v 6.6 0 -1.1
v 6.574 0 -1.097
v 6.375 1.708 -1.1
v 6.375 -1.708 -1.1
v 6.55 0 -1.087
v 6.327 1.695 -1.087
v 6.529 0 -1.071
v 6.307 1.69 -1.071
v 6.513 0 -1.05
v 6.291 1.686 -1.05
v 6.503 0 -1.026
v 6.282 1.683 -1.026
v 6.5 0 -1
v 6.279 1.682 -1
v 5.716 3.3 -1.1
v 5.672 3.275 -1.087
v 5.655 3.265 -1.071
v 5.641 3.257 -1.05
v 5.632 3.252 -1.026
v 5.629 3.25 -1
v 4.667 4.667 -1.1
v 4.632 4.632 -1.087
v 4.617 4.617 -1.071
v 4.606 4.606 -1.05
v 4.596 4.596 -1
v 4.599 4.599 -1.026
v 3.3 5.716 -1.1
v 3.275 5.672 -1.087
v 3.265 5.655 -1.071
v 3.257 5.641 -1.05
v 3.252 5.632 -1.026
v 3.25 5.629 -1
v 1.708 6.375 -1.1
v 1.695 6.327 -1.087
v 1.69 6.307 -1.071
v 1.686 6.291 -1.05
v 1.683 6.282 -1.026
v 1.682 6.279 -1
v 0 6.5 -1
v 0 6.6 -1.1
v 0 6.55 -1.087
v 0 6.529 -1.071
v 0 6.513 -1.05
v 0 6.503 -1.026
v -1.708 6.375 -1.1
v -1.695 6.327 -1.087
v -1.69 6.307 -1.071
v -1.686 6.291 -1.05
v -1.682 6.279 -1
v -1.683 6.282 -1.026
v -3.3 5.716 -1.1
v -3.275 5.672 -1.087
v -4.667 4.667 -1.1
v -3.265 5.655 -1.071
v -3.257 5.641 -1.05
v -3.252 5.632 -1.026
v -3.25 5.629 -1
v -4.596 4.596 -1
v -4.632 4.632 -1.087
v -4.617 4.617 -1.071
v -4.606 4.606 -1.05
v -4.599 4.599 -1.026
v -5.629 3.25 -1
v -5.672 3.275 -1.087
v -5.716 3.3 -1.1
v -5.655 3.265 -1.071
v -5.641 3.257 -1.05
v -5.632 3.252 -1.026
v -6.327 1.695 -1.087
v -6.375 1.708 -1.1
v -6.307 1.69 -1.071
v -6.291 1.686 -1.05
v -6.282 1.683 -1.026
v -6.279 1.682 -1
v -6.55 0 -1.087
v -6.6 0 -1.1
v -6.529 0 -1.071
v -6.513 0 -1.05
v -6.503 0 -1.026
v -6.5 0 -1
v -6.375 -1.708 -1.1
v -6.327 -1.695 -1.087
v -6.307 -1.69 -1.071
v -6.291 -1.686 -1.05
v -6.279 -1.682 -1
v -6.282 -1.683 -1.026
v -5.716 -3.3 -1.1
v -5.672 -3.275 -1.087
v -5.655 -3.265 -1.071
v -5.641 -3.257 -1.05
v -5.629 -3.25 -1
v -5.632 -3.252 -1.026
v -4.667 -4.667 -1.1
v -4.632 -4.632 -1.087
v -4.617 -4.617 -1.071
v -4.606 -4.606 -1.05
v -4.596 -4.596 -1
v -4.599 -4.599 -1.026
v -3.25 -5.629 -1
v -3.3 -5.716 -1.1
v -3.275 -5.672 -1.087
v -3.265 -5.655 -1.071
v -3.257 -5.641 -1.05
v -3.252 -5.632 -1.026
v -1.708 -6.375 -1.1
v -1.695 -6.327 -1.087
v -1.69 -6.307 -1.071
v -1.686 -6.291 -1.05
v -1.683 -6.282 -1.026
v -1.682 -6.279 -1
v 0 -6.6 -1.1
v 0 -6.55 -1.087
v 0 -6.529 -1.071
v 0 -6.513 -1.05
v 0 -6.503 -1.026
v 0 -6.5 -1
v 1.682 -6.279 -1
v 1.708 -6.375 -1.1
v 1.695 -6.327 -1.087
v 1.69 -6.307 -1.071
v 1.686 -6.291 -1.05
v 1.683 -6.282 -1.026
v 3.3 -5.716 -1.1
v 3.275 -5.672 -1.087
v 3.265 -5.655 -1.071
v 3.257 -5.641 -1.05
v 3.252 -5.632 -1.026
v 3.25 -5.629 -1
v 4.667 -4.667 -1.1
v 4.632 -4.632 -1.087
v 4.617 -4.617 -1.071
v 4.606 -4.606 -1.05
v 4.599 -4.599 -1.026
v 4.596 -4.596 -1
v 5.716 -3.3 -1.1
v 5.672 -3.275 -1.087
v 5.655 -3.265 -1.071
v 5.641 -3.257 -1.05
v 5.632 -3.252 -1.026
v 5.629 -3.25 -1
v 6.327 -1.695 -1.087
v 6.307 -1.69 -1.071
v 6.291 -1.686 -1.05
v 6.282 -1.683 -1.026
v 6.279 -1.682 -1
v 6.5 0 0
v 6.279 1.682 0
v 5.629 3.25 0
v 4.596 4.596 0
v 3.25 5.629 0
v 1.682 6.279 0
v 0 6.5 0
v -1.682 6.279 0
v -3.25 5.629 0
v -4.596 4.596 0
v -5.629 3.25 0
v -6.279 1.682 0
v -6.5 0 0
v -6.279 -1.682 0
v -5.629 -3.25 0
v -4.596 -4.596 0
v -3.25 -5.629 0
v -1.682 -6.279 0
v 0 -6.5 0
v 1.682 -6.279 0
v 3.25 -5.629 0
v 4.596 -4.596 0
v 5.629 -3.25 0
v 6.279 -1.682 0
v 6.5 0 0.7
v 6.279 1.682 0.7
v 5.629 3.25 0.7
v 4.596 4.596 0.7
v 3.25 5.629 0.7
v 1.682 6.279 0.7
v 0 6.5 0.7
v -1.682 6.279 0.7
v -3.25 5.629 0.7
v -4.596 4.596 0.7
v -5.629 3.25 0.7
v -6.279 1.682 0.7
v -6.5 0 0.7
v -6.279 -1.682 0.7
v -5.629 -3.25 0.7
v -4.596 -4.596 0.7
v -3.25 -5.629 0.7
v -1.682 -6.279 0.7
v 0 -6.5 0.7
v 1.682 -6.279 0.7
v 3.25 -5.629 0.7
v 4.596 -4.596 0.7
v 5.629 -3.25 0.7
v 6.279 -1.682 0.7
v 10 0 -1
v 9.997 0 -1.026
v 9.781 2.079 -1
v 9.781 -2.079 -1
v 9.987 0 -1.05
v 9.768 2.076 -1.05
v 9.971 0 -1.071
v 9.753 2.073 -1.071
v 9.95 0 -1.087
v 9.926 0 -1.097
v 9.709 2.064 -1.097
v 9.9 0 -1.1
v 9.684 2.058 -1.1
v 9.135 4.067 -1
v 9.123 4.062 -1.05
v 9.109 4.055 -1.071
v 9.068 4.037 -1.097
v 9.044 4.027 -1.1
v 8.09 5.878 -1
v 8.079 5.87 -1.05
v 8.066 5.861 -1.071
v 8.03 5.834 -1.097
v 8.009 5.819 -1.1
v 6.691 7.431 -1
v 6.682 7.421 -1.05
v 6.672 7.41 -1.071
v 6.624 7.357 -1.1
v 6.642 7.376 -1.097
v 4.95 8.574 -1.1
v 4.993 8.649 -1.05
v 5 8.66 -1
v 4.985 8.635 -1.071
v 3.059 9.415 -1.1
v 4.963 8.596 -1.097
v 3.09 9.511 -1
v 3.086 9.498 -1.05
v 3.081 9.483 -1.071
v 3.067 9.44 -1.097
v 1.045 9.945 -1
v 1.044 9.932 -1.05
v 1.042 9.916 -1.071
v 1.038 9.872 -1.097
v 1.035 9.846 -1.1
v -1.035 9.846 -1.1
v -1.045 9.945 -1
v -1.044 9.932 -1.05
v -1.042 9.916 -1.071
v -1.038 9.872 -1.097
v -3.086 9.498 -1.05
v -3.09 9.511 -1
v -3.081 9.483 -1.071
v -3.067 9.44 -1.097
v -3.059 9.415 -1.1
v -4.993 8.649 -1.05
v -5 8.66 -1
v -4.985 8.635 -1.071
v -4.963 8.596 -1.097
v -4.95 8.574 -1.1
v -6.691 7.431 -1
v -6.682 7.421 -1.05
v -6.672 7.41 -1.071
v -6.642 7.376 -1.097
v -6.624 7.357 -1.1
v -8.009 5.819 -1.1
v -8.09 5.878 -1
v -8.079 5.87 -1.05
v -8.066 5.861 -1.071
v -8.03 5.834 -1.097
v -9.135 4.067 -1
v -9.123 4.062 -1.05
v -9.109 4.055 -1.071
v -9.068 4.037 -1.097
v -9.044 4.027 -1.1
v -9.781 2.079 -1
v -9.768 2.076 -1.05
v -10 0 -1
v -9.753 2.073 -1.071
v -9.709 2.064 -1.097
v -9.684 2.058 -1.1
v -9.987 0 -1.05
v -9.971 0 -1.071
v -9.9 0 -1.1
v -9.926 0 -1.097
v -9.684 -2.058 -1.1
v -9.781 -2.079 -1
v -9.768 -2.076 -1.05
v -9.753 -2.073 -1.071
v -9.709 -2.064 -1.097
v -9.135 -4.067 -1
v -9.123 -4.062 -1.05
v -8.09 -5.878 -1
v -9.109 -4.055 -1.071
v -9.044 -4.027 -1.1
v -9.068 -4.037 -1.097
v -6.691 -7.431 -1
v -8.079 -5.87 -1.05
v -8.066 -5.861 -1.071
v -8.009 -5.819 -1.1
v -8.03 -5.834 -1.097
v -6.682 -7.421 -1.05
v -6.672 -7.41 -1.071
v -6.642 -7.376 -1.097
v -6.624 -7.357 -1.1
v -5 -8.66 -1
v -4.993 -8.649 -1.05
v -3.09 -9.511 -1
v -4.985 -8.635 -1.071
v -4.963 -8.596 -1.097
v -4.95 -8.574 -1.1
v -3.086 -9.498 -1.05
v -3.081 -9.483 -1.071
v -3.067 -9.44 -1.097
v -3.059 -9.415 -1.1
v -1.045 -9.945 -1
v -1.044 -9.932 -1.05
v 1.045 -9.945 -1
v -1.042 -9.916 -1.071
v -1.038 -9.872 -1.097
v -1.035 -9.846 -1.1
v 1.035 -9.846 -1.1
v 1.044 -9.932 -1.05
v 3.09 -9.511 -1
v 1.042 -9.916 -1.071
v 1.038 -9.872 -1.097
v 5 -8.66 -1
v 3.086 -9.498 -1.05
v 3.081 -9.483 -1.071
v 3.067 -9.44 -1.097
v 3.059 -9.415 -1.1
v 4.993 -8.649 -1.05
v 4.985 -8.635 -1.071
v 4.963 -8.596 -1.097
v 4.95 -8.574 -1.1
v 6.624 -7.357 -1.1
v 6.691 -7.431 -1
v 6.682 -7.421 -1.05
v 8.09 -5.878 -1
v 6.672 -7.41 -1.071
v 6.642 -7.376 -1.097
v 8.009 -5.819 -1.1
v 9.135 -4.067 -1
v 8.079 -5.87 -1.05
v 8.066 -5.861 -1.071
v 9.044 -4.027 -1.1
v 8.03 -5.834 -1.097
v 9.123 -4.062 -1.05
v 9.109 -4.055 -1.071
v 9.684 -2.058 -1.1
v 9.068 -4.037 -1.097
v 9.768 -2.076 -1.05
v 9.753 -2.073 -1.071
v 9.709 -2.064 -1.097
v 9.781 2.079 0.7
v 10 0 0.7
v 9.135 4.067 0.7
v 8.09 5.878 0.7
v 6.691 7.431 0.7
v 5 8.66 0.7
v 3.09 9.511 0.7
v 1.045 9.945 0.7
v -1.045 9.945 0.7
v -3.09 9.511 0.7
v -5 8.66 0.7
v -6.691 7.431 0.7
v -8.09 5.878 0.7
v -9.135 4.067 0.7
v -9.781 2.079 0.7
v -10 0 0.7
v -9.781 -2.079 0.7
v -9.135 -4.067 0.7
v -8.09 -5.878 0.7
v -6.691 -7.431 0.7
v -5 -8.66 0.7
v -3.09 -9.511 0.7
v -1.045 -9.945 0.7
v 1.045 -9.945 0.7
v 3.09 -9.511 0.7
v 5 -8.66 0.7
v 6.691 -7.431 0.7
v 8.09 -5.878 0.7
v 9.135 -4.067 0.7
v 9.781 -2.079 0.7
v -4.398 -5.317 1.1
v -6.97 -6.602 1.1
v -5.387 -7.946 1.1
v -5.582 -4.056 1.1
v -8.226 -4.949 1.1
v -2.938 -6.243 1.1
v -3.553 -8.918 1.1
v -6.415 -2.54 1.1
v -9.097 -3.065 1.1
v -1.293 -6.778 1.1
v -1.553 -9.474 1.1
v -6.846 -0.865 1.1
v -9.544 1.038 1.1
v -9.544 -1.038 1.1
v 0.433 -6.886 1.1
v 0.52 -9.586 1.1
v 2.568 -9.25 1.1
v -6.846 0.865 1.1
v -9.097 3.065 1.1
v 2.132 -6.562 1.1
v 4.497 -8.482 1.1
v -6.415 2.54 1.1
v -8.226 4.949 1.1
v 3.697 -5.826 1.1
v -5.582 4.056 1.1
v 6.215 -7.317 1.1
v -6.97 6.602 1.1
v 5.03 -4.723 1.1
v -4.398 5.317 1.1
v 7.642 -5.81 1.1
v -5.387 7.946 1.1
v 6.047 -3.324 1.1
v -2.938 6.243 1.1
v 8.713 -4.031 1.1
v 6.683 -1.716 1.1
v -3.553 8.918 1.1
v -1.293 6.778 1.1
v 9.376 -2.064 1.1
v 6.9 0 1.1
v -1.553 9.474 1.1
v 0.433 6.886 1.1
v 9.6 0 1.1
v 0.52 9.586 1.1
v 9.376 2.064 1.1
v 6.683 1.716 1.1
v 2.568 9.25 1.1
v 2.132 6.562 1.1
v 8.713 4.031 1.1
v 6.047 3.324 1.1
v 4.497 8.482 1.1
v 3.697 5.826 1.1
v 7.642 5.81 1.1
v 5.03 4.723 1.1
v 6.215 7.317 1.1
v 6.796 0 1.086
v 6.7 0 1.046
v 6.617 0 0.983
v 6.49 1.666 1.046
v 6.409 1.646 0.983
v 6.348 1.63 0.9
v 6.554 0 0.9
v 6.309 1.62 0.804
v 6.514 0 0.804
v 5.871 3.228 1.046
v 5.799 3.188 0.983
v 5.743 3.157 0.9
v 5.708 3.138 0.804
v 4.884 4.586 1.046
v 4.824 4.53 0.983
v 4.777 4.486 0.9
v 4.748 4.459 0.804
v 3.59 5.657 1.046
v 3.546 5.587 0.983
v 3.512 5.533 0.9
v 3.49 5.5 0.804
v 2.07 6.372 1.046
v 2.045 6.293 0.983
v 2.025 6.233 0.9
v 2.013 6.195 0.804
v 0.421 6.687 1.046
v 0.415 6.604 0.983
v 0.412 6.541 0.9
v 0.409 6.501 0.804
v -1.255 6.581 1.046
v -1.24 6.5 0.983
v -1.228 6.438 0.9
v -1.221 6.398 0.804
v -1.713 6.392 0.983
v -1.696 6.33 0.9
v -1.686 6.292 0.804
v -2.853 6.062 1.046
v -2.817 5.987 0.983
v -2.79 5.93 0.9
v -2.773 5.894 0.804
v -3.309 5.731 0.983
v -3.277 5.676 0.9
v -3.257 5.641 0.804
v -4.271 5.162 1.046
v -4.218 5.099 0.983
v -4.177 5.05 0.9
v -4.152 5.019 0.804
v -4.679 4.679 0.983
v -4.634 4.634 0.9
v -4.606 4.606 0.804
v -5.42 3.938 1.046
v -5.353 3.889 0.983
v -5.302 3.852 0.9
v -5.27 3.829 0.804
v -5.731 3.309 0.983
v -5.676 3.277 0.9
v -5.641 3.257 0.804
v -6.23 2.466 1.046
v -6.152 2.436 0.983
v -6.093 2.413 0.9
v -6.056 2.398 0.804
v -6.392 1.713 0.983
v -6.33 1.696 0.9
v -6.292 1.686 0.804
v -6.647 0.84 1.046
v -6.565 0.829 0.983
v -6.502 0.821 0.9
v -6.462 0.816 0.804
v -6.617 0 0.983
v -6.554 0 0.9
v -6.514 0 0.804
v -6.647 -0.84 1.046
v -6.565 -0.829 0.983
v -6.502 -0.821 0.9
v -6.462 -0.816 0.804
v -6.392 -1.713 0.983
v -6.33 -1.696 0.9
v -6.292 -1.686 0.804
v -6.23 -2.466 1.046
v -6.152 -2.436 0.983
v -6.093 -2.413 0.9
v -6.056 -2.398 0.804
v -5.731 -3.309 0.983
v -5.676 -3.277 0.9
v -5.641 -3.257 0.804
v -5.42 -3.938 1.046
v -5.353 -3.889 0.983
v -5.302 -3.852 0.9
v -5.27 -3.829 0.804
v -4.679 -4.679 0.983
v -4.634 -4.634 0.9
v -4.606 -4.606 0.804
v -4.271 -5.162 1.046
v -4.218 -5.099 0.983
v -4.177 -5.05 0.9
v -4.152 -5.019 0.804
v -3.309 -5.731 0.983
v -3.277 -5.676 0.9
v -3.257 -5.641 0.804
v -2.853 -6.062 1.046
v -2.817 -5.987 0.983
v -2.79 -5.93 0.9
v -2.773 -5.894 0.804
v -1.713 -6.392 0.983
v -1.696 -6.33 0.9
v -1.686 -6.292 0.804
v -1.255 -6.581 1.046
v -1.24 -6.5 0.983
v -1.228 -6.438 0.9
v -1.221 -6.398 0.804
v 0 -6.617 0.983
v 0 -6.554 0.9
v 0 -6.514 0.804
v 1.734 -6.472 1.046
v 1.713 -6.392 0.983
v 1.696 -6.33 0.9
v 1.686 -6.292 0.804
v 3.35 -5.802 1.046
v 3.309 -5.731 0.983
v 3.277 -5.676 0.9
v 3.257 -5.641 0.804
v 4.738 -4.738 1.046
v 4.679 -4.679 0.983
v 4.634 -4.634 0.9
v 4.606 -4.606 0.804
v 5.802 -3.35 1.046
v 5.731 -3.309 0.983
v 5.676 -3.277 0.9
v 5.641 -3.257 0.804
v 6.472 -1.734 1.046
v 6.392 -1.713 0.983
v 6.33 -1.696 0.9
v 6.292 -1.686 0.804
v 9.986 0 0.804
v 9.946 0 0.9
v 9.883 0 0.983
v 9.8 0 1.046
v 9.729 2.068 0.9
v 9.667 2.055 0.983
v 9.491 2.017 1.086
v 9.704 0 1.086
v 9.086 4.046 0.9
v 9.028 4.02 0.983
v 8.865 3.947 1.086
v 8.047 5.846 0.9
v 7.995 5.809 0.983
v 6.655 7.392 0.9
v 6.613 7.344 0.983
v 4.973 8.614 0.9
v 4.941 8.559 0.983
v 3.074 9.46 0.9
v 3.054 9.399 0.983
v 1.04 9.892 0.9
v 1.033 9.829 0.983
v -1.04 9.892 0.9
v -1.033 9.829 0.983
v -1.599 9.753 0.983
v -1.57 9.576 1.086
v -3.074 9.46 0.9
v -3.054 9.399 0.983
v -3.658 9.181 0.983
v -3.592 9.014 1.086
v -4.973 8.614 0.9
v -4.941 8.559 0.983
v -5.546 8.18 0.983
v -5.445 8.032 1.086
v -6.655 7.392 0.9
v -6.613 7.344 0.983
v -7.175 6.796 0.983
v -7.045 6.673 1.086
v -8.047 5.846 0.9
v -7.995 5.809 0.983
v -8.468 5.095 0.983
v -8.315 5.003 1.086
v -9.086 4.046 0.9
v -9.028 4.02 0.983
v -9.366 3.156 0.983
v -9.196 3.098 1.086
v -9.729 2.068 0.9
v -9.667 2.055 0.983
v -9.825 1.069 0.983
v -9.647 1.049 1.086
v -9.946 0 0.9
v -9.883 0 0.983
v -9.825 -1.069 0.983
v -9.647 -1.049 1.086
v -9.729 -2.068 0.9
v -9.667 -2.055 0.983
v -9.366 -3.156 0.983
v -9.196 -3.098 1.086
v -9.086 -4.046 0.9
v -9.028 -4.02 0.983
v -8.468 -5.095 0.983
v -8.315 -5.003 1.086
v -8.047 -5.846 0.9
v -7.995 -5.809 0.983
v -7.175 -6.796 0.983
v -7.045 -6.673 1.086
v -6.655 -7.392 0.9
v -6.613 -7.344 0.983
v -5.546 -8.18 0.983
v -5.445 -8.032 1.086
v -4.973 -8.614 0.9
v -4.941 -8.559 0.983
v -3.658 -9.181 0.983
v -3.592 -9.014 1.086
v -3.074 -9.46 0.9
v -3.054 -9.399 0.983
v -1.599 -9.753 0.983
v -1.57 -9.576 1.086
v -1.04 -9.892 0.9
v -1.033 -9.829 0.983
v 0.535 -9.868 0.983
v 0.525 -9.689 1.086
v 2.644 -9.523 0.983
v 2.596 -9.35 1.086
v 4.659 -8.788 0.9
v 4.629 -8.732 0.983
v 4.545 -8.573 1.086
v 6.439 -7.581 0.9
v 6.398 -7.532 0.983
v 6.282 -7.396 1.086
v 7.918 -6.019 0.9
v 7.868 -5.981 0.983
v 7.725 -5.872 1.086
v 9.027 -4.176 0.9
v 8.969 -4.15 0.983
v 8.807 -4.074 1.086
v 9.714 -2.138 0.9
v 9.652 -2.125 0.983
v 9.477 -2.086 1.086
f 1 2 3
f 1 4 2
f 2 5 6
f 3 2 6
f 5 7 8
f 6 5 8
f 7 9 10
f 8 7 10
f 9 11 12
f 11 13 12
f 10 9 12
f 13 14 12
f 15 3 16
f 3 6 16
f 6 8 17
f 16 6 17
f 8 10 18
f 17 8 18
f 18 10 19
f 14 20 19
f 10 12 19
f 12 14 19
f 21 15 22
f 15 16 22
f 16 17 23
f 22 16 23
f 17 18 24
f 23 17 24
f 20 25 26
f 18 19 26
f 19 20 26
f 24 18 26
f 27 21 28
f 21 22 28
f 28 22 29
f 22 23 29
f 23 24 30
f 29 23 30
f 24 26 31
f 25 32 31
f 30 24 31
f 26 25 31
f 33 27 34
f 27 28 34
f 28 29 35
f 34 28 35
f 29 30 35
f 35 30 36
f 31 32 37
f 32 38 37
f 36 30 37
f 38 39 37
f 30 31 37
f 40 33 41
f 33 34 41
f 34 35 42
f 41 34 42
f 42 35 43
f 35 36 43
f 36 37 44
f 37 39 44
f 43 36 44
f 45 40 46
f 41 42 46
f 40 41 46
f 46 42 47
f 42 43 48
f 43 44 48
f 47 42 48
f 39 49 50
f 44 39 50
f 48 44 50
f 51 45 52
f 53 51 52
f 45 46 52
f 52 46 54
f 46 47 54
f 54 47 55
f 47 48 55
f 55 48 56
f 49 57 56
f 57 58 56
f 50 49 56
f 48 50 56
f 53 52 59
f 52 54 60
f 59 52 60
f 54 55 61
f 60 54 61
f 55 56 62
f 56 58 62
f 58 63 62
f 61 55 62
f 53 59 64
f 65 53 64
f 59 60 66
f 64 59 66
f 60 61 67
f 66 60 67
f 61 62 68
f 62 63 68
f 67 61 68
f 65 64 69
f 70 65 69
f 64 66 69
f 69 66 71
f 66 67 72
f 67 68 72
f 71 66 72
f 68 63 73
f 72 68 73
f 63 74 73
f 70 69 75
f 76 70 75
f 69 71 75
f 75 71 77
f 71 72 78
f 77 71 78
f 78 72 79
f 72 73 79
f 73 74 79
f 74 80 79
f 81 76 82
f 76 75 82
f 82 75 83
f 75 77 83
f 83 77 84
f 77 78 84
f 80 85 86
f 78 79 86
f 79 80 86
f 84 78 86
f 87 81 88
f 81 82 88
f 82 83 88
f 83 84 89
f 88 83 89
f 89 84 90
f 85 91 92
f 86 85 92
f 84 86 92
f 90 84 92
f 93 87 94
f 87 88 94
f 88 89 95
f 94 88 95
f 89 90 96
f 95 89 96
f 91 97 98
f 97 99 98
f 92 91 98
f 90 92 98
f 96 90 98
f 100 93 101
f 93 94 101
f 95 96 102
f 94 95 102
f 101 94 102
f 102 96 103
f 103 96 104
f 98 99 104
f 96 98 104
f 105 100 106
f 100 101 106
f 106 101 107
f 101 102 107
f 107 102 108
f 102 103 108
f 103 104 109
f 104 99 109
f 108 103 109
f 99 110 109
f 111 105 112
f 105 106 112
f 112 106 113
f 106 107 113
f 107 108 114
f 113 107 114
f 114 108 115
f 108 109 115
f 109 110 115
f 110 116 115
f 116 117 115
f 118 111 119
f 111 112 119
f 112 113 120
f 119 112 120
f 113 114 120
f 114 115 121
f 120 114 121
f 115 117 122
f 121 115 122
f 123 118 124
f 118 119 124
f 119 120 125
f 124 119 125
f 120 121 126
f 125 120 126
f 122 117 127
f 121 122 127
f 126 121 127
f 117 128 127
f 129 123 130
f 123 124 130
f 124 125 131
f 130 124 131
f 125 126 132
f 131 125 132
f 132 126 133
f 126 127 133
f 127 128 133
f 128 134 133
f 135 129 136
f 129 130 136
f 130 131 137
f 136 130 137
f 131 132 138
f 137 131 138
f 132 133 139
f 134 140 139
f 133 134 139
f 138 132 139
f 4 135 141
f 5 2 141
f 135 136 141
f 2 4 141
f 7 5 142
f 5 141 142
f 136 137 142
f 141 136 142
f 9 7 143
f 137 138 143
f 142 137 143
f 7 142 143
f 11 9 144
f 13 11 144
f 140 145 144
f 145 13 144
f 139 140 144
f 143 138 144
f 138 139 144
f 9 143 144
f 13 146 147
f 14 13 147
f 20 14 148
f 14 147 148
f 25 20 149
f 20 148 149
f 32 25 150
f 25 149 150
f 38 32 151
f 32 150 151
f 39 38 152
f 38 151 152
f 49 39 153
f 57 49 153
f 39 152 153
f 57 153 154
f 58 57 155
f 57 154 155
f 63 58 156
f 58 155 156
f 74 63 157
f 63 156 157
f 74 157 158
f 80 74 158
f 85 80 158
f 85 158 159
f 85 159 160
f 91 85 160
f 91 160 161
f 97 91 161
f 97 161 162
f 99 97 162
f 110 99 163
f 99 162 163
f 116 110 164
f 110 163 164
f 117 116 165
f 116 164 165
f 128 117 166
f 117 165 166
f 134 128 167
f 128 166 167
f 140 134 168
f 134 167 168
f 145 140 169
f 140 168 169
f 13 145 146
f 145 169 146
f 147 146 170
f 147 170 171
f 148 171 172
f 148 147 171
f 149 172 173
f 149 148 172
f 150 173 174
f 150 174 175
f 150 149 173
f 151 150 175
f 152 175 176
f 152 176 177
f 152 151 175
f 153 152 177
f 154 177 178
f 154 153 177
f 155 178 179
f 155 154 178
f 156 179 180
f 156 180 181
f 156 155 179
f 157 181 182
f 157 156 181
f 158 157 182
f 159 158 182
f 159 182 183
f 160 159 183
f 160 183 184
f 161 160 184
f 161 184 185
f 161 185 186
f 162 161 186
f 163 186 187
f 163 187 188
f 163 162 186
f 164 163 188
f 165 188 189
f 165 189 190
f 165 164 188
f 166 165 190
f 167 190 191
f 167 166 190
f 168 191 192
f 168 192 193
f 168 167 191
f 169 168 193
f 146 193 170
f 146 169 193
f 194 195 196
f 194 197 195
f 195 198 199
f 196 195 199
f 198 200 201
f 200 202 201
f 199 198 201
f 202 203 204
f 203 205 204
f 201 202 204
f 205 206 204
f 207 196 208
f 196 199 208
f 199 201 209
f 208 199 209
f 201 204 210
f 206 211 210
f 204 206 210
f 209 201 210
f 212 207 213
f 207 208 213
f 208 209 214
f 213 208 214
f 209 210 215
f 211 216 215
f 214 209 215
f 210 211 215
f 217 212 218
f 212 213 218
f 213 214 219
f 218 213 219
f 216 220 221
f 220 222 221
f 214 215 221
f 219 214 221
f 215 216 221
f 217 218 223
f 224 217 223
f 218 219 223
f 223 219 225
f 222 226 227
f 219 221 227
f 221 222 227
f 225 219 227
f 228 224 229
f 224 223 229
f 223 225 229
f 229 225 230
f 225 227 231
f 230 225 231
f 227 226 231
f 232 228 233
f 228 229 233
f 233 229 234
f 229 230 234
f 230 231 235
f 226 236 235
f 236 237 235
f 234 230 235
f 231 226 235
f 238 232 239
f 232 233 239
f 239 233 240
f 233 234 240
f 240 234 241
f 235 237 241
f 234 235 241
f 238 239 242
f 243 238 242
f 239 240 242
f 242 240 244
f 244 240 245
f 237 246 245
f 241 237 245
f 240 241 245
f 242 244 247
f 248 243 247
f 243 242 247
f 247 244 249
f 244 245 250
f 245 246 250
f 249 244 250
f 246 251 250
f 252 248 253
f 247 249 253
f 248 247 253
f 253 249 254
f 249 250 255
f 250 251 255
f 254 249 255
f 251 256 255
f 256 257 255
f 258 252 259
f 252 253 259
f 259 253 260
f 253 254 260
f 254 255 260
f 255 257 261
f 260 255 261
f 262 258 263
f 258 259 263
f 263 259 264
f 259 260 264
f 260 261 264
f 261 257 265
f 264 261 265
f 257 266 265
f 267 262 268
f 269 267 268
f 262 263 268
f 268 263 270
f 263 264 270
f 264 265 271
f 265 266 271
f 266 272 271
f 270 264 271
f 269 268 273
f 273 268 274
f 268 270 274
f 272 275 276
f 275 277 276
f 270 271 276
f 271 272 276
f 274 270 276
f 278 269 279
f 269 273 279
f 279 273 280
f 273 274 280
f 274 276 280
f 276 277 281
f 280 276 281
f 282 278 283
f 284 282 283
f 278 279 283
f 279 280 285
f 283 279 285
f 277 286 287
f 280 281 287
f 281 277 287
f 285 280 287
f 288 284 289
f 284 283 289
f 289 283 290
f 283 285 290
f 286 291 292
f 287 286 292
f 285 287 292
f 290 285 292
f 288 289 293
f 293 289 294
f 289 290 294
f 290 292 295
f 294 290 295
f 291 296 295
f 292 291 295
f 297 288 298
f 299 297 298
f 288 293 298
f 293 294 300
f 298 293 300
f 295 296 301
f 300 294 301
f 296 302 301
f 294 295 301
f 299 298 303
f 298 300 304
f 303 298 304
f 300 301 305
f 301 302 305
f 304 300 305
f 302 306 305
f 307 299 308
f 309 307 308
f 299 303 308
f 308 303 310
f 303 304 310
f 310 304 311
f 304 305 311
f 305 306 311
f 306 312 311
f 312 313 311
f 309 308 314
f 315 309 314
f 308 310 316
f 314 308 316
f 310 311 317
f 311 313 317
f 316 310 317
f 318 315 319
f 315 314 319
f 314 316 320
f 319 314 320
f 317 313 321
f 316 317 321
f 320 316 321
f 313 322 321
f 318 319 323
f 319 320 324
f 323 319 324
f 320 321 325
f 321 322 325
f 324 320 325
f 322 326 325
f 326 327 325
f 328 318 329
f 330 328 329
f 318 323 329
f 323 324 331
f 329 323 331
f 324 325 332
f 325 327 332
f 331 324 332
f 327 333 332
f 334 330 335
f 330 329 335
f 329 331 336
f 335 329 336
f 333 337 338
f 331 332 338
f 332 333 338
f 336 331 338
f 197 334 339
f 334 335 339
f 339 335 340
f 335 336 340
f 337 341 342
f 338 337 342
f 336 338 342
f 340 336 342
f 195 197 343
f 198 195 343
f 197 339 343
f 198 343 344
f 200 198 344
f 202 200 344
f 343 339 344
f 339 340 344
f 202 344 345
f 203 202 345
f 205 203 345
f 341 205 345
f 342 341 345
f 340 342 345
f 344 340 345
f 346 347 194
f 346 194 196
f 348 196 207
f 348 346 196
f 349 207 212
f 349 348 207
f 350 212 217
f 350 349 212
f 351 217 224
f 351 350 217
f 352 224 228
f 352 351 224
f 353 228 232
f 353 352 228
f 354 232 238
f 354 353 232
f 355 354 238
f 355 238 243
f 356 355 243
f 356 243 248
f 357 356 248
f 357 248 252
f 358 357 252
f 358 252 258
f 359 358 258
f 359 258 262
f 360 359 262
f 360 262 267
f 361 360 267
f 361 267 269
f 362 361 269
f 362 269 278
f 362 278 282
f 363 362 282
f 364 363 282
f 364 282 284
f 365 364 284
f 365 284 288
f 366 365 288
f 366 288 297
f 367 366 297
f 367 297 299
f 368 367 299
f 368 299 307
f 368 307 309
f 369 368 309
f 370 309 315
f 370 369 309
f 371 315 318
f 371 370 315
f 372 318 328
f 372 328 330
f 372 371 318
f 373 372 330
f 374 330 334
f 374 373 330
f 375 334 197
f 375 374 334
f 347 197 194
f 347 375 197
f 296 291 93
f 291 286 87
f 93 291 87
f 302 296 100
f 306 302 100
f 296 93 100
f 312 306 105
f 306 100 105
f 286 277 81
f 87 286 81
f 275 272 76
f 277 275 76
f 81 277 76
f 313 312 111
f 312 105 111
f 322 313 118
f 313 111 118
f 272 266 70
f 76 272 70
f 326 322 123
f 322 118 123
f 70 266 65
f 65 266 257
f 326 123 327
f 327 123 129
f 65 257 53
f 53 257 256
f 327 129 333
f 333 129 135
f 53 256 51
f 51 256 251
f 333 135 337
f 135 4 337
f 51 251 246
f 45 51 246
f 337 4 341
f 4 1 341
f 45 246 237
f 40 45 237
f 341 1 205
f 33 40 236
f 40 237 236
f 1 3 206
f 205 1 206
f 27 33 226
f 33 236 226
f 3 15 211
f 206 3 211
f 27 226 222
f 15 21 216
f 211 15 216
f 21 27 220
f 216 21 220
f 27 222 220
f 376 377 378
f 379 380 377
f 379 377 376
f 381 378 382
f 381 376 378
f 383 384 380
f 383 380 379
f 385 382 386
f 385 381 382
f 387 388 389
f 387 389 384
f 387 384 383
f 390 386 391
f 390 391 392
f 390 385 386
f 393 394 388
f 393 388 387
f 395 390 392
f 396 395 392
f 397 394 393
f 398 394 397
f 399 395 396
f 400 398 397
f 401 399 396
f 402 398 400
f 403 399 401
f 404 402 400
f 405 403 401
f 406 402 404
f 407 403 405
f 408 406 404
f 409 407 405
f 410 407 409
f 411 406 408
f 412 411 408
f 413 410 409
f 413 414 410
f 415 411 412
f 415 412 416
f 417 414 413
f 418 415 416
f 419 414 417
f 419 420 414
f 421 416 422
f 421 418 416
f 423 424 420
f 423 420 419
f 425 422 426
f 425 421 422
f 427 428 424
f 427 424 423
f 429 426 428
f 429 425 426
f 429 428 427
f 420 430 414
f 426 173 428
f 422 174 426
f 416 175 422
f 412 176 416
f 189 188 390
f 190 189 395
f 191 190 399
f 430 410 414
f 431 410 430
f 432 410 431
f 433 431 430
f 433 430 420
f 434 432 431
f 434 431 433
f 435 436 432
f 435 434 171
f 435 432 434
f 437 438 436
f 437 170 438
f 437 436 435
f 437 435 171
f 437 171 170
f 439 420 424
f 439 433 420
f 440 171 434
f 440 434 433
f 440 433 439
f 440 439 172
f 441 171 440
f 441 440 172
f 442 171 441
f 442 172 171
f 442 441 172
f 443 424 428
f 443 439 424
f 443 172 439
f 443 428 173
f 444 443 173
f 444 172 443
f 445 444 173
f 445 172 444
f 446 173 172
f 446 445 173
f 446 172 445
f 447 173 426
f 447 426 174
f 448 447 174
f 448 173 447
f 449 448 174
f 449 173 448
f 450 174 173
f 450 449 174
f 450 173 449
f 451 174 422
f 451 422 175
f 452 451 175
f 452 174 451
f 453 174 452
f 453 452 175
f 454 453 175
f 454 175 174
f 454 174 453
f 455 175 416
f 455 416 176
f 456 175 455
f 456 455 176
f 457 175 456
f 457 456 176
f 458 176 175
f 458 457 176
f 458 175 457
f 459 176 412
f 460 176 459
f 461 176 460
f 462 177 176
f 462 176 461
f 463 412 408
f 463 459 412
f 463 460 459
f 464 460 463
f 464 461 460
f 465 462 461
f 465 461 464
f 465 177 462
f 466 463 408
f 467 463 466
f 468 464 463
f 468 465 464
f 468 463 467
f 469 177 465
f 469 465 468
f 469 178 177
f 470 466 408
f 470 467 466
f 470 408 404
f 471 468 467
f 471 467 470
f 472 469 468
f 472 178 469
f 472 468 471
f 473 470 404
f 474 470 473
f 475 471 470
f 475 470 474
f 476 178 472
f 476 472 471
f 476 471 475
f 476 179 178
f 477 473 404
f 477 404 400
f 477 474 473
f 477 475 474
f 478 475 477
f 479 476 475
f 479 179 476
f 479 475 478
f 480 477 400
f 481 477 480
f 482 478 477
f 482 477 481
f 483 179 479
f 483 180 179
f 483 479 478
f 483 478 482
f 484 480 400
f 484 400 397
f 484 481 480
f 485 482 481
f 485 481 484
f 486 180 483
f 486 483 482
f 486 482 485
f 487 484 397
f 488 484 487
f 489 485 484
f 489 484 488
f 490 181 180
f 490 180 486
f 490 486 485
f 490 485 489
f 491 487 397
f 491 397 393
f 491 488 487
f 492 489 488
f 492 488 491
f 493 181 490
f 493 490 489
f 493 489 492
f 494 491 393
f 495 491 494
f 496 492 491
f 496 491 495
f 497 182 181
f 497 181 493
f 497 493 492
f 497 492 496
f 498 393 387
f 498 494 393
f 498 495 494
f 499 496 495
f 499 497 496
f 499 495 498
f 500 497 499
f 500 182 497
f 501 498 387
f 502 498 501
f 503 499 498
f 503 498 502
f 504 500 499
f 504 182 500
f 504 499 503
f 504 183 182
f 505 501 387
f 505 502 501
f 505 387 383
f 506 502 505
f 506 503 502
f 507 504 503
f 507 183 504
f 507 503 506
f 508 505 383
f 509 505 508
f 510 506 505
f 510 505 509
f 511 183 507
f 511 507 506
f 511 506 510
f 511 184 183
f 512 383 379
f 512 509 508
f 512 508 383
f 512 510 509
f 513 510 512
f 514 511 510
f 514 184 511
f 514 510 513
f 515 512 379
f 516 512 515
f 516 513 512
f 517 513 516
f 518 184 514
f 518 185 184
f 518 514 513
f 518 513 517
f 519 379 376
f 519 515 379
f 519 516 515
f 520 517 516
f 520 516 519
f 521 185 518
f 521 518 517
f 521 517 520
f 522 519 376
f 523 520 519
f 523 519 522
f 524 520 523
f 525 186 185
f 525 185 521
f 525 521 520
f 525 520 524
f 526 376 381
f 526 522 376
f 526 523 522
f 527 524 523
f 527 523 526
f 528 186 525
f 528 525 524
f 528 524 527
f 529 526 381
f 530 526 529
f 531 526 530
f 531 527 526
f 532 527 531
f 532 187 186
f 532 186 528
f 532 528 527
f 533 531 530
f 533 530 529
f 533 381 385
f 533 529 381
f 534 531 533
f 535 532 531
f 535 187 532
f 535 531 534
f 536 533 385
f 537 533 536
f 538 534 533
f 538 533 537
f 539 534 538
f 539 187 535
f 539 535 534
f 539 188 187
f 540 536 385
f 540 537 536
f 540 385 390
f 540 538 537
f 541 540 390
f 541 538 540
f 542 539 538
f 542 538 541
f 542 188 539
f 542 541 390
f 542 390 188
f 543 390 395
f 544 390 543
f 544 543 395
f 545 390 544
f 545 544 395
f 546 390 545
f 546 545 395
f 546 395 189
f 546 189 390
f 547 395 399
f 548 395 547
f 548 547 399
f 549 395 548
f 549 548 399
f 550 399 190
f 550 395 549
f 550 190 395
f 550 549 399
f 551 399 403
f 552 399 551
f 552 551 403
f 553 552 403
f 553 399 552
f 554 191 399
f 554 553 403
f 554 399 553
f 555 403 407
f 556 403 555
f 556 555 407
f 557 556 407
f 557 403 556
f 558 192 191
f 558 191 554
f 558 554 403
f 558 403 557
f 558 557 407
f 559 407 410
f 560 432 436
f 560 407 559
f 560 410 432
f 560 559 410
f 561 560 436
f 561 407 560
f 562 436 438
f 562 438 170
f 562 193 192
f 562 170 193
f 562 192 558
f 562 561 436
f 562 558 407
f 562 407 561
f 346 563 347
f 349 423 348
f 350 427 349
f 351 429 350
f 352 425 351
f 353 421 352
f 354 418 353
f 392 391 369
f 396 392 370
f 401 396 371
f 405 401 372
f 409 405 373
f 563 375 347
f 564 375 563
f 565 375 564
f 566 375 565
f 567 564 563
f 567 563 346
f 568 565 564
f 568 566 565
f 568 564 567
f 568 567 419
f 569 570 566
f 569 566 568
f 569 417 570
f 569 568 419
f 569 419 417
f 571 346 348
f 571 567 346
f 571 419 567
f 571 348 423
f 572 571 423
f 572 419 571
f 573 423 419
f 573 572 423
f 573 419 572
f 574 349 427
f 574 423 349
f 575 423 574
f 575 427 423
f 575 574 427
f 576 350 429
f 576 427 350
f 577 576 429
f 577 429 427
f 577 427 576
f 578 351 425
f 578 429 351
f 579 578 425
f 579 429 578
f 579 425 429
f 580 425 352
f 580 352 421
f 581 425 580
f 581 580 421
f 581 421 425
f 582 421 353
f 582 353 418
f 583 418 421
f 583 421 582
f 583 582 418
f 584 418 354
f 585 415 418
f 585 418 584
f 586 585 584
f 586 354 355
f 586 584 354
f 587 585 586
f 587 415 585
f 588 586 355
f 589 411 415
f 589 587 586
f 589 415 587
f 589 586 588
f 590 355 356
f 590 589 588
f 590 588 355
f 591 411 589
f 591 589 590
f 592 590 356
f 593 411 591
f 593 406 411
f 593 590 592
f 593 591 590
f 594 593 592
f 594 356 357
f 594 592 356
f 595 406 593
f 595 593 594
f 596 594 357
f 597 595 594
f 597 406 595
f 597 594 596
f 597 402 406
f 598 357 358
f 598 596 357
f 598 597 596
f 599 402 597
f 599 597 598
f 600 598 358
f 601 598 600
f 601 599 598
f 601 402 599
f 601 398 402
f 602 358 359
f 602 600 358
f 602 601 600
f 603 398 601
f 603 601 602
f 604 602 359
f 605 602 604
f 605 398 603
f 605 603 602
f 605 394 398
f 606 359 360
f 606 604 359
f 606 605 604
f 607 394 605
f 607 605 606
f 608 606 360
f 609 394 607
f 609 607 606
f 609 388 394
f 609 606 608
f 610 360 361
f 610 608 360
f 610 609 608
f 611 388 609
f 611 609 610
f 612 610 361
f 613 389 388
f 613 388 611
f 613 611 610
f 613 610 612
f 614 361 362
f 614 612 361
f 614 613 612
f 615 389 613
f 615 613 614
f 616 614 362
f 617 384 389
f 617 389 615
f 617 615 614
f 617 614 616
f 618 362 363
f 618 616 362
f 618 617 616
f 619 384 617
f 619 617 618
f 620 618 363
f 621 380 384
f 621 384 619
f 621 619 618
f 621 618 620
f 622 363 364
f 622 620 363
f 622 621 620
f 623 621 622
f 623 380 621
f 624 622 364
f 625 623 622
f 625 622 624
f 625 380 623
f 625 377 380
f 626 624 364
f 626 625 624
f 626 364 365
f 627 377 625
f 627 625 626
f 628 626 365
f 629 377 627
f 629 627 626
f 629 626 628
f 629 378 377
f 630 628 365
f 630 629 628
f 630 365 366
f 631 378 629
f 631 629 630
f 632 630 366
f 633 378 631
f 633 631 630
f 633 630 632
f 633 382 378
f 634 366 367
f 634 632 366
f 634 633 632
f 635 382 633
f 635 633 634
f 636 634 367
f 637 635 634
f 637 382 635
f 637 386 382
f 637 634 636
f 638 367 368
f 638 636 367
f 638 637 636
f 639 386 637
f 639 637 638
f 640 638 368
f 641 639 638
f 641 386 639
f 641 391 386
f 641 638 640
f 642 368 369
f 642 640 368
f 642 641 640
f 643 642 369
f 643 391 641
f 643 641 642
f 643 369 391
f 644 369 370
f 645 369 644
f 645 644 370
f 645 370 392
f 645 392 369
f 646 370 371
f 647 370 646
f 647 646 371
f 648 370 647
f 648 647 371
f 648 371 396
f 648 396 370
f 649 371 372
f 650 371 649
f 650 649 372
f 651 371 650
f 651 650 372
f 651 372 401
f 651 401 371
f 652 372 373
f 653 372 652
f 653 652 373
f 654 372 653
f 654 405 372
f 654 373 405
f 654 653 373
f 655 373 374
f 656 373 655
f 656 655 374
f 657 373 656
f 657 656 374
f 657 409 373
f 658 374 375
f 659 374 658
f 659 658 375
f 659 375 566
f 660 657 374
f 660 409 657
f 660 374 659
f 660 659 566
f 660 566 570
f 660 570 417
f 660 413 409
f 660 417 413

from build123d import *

# Parameters (mm, degrees)
SKETCH3_R                = 10
SKETCH3_R_2              = 6.5
BOSS_EXTRUDE1_DEPTH      = 1.1
BOSS_EXTRUDE1_DEPTH_BACK = 1.1
FILLET1_R                = 0.4
FILLET2_R                = 0.1


with BuildPart() as part:
    # Sketch3 → Boss-Extrude1 (new body, two sides)
    with BuildSketch(Plane.XY) as boss_extrude1_sk:
        Circle(SKETCH3_R)
        Circle(SKETCH3_R_2, mode=Mode.SUBTRACT)
    extrude(amount=BOSS_EXTRUDE1_DEPTH)
    extrude(boss_extrude1_sk.sketch, amount=-BOSS_EXTRUDE1_DEPTH_BACK)

    # Fillet1
    fillet1_edges = [part.edges().sort_by_distance(p)[0] for p in [
        (-10, 0, 1.1),
        (-6.5, 0, 1.1),
    ]]
    fillet(fillet1_edges, radius=FILLET1_R)

    # Fillet2
    fillet2_edges = [part.edges().sort_by_distance(p)[0] for p in [
        (-10, 0, -1.1),
        (-6.5, 0, -1.1),
    ]]
    fillet(fillet2_edges, radius=FILLET2_R)


solid = part.part
